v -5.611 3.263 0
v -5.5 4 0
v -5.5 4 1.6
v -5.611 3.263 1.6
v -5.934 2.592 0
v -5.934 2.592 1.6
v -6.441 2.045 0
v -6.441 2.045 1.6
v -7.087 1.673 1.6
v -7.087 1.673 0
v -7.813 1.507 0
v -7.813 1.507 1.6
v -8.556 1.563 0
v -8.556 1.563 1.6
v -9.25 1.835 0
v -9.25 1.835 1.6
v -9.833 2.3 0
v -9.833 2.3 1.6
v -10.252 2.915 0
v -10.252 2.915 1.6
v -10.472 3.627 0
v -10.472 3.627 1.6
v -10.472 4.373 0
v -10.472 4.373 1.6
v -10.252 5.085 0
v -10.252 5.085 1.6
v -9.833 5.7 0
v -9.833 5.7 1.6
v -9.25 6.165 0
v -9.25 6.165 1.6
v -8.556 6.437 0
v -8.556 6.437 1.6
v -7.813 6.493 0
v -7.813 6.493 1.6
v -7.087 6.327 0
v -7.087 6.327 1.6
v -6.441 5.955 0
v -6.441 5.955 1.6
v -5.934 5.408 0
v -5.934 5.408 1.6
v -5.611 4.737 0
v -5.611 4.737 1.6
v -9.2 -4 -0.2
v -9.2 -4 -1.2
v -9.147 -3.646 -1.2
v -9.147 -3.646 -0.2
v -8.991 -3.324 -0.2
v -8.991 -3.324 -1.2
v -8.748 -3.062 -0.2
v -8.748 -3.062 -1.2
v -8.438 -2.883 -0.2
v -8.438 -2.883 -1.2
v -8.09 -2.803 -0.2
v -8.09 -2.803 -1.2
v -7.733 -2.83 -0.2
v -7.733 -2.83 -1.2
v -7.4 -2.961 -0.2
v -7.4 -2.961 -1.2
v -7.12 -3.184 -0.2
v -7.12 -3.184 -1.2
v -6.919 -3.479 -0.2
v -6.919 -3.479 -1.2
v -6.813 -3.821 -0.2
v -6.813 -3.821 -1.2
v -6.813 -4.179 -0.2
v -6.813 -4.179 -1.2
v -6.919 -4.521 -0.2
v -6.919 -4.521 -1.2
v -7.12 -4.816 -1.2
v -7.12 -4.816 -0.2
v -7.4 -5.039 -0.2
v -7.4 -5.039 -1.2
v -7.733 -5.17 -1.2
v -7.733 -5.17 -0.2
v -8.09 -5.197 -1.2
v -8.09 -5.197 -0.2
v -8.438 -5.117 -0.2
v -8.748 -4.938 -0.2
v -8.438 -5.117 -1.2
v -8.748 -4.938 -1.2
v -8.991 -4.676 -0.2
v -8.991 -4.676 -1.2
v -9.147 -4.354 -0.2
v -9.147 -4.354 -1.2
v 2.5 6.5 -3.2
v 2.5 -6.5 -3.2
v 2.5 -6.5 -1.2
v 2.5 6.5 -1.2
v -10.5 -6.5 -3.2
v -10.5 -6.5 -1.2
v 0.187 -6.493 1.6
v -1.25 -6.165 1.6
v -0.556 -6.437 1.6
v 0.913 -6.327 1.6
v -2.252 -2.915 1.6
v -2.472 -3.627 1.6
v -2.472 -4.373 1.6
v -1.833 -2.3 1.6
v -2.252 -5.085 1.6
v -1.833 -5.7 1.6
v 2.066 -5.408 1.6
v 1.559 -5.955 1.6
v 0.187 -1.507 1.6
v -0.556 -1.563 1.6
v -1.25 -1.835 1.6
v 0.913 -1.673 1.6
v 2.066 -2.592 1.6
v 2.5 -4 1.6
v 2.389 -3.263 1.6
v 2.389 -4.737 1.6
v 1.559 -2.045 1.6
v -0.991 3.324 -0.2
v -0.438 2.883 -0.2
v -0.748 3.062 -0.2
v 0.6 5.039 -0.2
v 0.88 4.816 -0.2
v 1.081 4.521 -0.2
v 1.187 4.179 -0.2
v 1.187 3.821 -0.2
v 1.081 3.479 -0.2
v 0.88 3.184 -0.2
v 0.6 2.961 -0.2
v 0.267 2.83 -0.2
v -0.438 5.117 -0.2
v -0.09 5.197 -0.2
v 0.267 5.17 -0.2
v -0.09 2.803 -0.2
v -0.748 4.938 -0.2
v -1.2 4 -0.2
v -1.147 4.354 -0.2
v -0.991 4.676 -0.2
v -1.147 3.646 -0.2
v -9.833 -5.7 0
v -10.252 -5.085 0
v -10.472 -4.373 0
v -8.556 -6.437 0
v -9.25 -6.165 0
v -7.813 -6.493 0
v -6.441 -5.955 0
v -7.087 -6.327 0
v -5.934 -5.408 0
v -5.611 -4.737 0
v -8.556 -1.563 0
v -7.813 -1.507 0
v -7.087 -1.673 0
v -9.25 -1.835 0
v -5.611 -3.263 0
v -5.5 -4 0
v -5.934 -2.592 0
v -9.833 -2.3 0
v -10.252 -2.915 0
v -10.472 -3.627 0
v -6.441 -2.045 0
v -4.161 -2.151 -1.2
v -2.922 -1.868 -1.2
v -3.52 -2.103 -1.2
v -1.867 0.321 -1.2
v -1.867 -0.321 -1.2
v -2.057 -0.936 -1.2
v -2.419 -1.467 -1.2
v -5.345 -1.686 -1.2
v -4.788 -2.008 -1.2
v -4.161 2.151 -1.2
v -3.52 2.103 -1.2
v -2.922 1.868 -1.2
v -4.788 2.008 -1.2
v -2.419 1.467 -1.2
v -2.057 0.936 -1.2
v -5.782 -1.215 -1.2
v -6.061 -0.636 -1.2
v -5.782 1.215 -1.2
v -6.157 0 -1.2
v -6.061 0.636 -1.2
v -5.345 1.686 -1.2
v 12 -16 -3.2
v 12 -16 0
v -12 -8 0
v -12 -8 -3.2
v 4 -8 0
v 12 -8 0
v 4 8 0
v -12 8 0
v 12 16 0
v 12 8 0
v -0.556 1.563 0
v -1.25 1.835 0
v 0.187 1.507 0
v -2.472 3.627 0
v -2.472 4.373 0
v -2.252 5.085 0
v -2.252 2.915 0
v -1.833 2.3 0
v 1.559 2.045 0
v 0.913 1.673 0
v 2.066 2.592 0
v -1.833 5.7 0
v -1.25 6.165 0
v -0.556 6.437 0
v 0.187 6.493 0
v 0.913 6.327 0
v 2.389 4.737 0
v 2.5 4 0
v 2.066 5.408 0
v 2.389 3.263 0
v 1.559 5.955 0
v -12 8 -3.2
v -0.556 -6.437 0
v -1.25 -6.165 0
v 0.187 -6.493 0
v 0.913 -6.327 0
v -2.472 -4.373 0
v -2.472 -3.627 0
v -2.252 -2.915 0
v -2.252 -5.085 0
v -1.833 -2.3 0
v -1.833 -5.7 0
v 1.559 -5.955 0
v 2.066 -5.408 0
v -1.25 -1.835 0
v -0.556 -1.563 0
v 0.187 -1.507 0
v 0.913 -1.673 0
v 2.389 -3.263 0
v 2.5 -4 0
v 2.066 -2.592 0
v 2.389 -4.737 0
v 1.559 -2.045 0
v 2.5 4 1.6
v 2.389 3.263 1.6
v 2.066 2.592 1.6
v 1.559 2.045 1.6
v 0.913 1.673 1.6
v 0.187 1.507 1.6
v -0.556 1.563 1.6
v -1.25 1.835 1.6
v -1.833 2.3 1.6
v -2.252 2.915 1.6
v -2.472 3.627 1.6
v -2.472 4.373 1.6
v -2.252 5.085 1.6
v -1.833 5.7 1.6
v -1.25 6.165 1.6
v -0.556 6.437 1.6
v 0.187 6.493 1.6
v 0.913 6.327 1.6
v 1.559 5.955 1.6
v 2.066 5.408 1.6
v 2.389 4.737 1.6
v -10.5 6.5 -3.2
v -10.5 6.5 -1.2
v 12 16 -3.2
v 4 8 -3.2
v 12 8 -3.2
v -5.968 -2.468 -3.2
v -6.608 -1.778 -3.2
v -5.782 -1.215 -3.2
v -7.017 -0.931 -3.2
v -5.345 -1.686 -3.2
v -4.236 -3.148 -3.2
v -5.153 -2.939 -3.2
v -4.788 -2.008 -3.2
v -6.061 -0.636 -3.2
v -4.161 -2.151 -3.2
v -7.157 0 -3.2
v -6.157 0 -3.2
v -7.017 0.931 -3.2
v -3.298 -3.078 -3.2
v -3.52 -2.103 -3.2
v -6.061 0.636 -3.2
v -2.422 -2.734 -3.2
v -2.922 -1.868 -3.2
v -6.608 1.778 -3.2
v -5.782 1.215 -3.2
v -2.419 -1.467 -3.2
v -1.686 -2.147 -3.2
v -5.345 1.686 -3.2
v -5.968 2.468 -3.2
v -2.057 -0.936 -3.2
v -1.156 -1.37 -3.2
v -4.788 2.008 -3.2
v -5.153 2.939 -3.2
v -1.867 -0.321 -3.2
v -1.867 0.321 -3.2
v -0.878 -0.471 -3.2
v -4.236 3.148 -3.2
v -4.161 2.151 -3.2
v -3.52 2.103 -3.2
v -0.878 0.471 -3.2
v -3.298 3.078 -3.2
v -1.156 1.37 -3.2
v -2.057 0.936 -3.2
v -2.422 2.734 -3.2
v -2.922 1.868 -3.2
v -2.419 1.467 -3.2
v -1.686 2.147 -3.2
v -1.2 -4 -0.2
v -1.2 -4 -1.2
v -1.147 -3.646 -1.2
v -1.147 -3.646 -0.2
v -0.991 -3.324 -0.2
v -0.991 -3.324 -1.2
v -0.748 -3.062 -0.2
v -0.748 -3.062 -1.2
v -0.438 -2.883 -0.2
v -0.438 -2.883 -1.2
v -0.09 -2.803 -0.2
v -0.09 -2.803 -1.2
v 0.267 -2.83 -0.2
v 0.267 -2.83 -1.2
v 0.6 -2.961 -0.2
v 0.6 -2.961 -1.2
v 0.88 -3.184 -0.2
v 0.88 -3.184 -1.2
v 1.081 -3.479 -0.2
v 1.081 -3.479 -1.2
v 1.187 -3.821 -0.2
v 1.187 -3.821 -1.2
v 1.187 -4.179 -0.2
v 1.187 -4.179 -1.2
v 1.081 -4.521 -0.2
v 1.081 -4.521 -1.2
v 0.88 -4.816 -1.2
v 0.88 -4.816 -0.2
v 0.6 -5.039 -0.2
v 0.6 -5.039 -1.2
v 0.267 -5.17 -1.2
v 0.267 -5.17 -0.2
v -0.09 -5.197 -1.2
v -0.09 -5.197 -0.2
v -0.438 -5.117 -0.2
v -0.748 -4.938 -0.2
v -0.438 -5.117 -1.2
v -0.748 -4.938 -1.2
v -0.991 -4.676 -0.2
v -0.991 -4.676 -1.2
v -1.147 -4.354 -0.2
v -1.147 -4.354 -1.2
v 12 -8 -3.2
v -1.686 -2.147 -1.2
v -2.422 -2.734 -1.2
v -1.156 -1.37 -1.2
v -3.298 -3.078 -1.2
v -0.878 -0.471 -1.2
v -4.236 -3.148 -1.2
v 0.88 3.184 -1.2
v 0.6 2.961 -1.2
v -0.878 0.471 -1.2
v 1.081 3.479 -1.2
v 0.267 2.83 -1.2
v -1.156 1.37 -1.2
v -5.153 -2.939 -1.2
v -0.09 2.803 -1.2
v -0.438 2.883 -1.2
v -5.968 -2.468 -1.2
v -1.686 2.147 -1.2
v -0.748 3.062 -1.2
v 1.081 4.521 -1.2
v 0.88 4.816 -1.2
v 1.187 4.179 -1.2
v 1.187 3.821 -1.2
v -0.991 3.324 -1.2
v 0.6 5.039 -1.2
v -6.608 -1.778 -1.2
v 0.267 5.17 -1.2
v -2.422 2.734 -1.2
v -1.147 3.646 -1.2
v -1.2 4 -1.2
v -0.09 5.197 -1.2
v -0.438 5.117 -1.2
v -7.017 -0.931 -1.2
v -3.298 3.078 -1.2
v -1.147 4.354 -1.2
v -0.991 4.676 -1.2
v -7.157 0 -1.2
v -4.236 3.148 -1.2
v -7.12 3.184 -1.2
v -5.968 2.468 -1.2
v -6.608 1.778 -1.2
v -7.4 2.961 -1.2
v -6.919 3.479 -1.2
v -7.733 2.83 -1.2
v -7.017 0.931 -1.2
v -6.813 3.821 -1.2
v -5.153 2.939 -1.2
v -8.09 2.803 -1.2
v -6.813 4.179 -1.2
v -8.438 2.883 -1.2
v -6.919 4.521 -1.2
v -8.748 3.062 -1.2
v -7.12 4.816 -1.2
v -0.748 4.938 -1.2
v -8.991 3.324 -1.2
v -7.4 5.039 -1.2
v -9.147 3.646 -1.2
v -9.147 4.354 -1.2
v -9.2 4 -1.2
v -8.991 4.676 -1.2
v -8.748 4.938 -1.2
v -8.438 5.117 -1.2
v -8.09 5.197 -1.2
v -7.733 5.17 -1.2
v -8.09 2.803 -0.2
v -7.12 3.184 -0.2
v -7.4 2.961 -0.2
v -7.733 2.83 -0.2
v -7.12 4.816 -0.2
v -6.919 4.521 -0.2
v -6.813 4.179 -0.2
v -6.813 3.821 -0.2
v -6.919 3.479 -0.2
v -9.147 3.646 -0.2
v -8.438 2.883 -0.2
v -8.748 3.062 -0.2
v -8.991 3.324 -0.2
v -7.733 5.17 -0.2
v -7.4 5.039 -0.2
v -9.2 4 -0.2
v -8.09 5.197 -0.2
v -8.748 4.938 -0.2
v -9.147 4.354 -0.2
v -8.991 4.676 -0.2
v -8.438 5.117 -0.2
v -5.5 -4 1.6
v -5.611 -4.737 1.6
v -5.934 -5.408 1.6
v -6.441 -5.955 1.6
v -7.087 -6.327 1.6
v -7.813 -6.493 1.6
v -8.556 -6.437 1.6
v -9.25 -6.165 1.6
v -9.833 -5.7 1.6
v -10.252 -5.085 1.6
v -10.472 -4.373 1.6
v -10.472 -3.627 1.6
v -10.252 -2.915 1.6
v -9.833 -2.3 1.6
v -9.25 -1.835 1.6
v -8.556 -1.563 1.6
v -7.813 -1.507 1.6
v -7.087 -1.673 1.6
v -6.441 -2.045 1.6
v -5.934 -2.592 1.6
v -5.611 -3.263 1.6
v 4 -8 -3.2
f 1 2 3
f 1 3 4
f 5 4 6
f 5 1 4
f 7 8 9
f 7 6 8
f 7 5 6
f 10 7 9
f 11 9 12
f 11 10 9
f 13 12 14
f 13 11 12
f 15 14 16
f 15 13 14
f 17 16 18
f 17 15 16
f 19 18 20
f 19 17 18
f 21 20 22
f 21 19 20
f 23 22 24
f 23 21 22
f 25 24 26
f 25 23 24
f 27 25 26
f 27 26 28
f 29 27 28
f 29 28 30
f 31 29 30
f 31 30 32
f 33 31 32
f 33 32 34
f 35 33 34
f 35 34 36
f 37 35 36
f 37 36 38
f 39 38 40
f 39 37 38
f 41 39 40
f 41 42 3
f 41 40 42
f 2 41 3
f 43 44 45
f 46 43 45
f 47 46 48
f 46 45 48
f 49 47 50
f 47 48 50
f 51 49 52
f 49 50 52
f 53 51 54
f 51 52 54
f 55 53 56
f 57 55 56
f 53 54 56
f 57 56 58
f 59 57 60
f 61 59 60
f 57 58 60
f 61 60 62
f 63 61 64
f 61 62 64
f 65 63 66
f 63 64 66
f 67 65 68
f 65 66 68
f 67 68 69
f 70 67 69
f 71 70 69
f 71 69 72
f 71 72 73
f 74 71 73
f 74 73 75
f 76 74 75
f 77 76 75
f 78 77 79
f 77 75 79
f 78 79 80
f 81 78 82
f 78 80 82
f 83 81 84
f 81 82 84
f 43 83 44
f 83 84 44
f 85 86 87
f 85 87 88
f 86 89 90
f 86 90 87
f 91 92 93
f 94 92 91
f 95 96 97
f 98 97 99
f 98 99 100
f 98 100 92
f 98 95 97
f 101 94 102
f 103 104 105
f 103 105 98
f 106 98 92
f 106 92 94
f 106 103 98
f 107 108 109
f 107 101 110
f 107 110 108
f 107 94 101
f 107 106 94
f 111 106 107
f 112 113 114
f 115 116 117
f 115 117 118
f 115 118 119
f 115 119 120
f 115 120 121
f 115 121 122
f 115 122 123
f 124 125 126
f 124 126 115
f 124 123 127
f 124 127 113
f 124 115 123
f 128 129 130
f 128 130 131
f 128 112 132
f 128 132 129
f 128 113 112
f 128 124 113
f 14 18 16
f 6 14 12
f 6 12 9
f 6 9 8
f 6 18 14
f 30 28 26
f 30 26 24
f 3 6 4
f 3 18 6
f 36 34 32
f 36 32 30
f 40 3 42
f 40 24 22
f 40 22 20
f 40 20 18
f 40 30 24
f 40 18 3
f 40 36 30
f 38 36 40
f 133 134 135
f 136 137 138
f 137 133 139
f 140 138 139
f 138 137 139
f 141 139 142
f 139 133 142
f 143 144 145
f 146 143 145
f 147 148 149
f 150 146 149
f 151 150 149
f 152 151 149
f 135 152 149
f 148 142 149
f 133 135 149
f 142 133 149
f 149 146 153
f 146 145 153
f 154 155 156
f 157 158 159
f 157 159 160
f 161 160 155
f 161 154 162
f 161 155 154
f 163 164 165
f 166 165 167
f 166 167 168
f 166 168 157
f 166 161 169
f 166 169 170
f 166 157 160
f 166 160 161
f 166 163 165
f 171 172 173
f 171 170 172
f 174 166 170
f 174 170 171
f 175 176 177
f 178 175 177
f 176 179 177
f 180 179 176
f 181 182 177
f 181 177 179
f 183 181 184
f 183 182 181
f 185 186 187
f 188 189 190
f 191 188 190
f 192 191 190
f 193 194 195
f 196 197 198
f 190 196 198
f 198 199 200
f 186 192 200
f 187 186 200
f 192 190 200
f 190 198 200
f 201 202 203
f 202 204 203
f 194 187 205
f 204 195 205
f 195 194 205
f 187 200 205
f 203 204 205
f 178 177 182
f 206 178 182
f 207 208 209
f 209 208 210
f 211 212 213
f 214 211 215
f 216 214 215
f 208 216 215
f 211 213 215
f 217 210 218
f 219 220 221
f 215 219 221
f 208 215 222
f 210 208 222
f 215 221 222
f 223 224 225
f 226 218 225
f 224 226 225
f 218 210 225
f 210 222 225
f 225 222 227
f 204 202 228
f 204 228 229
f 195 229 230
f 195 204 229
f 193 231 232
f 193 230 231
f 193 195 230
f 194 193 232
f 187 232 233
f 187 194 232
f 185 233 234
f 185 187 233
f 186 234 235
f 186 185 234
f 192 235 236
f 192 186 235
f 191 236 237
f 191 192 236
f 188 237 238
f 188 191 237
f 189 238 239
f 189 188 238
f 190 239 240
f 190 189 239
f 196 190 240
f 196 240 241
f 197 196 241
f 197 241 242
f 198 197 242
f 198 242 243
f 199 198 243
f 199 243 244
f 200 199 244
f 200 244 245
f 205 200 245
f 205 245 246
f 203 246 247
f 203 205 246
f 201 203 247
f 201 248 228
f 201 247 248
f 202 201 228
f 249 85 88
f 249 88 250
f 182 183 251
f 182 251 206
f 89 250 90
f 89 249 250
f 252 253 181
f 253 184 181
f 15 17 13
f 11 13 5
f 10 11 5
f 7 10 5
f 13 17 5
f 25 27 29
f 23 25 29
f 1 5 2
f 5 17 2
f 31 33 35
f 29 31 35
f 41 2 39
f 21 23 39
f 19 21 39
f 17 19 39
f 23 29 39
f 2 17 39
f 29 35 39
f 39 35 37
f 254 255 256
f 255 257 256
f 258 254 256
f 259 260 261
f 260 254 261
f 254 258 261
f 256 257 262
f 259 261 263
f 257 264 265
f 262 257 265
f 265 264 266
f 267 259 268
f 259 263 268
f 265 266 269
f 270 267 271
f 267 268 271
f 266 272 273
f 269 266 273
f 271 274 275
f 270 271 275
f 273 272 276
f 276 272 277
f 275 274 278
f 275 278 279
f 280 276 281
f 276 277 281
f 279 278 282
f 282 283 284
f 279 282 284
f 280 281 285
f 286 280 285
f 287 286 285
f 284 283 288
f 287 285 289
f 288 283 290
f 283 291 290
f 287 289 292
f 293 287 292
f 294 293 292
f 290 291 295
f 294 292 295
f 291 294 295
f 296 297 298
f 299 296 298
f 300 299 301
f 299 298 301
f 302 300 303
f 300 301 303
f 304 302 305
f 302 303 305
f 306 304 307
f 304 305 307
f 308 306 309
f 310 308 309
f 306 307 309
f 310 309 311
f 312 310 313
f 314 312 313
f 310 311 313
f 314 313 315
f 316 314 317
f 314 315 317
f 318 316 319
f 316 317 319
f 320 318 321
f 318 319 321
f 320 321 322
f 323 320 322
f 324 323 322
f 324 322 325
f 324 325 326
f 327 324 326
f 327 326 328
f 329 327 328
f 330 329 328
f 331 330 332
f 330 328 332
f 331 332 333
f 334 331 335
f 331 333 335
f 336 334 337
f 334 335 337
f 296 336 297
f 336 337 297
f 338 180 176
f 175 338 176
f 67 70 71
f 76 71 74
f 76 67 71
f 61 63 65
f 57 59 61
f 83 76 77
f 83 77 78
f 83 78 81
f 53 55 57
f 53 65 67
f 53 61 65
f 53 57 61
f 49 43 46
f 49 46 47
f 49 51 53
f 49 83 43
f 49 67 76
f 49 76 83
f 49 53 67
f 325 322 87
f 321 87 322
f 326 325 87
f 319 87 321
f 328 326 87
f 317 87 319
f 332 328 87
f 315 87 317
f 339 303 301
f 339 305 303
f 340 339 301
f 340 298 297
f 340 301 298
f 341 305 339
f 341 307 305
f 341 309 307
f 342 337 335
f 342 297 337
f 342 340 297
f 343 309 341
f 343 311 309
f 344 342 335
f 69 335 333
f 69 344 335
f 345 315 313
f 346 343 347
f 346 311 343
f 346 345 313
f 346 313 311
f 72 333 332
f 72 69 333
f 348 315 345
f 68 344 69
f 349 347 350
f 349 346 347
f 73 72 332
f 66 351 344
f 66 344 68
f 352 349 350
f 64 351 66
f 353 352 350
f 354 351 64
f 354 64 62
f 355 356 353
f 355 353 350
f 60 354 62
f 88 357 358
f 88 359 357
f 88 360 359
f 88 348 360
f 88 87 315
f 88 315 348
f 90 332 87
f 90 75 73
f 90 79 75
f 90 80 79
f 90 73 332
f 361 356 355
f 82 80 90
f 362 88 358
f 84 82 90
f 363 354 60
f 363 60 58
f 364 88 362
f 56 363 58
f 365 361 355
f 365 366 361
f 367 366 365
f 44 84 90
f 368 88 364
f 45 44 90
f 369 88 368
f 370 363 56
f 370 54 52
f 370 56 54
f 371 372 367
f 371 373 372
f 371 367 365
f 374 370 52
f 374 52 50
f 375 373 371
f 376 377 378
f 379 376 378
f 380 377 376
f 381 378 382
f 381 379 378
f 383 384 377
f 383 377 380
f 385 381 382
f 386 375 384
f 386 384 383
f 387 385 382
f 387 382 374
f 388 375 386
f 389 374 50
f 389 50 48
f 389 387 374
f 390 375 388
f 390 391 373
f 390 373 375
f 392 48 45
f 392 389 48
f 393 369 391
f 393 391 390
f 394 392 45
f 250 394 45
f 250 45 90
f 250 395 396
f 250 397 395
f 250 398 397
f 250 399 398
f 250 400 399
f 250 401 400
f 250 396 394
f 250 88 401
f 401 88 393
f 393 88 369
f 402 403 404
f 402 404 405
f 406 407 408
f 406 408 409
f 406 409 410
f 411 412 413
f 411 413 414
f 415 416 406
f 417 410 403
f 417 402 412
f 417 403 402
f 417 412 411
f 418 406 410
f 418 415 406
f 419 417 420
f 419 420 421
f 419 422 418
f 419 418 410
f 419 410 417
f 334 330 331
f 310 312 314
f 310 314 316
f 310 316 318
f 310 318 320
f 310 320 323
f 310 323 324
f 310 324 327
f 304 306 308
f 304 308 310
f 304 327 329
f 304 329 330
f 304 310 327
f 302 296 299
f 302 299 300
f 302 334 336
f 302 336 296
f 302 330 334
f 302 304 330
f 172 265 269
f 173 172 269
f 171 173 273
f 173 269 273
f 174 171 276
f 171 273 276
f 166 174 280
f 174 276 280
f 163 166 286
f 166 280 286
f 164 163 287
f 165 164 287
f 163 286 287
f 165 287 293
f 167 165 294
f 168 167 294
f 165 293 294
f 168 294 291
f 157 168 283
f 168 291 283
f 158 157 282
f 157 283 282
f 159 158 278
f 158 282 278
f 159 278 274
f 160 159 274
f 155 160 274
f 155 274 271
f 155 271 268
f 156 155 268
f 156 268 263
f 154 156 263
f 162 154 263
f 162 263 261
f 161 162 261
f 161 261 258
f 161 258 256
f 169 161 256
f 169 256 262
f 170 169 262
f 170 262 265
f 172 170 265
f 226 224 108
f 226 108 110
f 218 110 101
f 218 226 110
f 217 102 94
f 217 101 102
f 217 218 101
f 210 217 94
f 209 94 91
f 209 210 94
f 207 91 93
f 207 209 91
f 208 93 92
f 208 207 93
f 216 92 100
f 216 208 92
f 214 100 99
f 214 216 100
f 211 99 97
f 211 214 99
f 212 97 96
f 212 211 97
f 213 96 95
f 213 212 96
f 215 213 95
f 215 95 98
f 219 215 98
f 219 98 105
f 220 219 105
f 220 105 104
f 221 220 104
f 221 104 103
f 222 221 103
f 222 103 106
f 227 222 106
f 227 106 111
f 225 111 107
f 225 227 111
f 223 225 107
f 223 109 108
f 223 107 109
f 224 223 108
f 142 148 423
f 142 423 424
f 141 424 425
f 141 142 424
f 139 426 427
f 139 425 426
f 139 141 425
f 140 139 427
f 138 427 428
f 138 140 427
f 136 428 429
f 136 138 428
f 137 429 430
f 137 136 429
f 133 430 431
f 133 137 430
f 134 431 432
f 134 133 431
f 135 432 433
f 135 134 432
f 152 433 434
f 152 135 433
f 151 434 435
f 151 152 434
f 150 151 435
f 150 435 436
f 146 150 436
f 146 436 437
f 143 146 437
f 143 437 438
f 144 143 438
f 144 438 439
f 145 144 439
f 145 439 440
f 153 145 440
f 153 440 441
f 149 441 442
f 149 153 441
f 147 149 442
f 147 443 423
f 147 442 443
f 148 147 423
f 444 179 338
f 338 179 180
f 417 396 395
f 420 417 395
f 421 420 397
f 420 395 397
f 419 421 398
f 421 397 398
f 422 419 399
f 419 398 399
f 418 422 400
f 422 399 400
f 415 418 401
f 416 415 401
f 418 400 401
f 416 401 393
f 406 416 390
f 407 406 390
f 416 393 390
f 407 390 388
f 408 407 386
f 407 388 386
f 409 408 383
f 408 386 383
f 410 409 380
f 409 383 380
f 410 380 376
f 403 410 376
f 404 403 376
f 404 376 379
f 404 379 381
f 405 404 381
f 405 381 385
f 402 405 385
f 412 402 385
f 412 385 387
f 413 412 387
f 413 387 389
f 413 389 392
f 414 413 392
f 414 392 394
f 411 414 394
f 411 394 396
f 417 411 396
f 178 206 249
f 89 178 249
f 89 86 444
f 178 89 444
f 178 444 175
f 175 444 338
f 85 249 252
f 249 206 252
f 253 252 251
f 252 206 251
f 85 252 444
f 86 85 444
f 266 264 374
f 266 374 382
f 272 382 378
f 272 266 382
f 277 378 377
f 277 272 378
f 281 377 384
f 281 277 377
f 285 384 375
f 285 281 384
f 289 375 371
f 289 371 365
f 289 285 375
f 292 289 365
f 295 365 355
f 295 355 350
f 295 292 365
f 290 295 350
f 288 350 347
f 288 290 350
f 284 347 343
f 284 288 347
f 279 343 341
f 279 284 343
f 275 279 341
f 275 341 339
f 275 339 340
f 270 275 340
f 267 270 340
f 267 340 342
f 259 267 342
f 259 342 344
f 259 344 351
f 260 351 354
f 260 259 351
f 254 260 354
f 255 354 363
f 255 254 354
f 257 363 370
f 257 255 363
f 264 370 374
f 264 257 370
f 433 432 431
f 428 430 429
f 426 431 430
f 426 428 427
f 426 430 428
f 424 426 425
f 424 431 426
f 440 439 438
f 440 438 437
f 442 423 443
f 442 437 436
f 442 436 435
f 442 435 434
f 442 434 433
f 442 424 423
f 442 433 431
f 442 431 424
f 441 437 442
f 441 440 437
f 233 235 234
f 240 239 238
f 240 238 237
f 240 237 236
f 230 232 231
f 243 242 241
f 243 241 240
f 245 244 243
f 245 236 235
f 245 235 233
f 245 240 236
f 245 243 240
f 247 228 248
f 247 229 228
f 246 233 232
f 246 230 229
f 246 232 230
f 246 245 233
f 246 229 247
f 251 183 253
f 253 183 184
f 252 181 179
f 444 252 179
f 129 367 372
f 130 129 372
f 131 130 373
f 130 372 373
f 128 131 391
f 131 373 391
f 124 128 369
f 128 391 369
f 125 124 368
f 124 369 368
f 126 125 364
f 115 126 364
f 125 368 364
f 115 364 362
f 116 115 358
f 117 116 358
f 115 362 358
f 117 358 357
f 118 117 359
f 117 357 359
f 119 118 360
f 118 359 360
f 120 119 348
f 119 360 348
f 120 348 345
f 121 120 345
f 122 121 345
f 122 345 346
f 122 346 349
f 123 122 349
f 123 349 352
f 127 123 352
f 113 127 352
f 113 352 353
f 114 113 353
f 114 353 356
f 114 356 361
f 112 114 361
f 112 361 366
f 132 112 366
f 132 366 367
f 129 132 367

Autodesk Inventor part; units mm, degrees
ref_plane "YZ Plane" through (0, 0, 0) normal (1, 0, 0) x (0, 1, 0)
ref_plane "XZ Plane" through (0, 0, 0) normal (0, 1, 0) x (-1, 0, 0)
ref_plane "XY Plane" through (0, 0, 0) normal (0, 0, 1) x (1, 0, 0)
sketch "Sketch1" plane through (0, 0, 0) normal (0, 0, 1) x (1, 0, 0)
  line L0 (-16.8, 0) -> (16.8, 0) construction
  line L1 (0, -22.4) -> (0, 22.4) construction
  line L2 (-12, 16) -> (12, 16)
  line L3 (12, 16) -> (12, -16)
  line L4 (12, -16) -> (-12, -16)
  line L5 (-12, -16) -> (-12, 16)
  line L6 (-8, 4) -> (0, 4) construction
  line L7 (0, 4) -> (0, -4) construction
  line L8 (0, -4) -> (-8, -4) construction
  line L9 (-8, -4) -> (-8, 4) construction
  circle A0 centre (-8, 4) radius 2.5
  circle A1 centre (0, 4) radius 2.5
  circle A2 centre (0, -4) radius 2.5
  circle A3 centre (-8, -4) radius 2.5
  line L10 (12, 8) -> (4, 8)
  line L11 (4, 16) -> (4, -16)
  line L12 (4, -8) -> (12, -8)
  line L13 (12, 16) -> (-12, 8)
  line L14 (12, -16) -> (-12, -8)
  line L15 (8, -12) -> (8, 12) construction
  line L16 (5.5, -14.5) -> (10.5, -14.5)
  line L17 (10.5, -14.5) -> (10.5, -9.5)
  line L18 (10.5, -9.5) -> (5.5, -9.5)
  line L19 (5.5, -9.5) -> (5.5, -14.5)
  line L20 (5.5, 9.5) -> (10.5, 9.5)
  line L21 (10.5, 9.5) -> (10.5, 14.5)
  line L22 (10.5, 14.5) -> (5.5, 14.5)
  line L23 (5.5, 14.5) -> (5.5, 9.5)
  line L24 (5.5, -9.5) -> (10.5, -14.5) construction
  line L25 (5.5, 9.5) -> (10.5, 14.5) construction
  point P0 (12, 0)
  point P1 (0, 16)
  point P2 (0, 0)
  point P3 (4, 0)
  point P4 (8, 0)
  point P5 (8, -8)
  dimension "d0" = 24
  dimension "d1" = 32
  dimension "d2" = 5
  dimension "d3" = 8
  dimension "d4" = 8
  dimension "d5" = 16
  dimension "d10" = 24
  dimension "d11" = 5
  dimension "d14" = 8
extrude "Extrusion1" add sketch "Sketch1" against normal blind 3.2 contours L13 L11 L14 L5 | L3 L10 L11 L13 L23 L20 L21 L22 | L22 L21 L20 L23 L13 | L11 L12 L3 L14 L16 L17 L18 L19 | L19 L18 L17 L16 L14 | A0 | A1 | A2 | A3
extrude "Extrusion2" add sketch "Sketch1" along normal blind 1.6 separate body contours A0 | A1 | A2 | A3
sketch "Sketch3" plane through (0, 0, -3.2) normal (0, 0, -1) x (-1, 0, 0)
  line L0 (-4, 8) -> (-12, 8) projected
  line L1 (-4, -8) -> (-4, 8) projected
  line L2 (-2.5, 6.5) -> (10.5, 6.5)
  line L3 (10.5, 6.5) -> (10.5, -6.5)
  line L4 (10.5, -6.5) -> (-2.5, -6.5)
  line L5 (-2.5, -6.5) -> (-2.5, 6.5)
  circle A0 centre (0, 4) radius 2.5 construction
  circle A1 centre (8, 4) radius 2.5 construction
  circle A2 centre (8, -4) radius 2.5 construction
  circle A3 centre (0, -4) radius 2.5 construction
  circle A4 centre (4, 0) radius 3.1569
  circle A5 centre (4, 0) radius 2.1569
  point P0 (0, 0)
  dimension "d20" = 13
  dimension "d21" = 13
  dimension "d22" = 1.5
  dimension "d23" = 1.5
  dimension "d24" = 1
extrude "Extrusion6" cut sketch "Sketch3" against normal blind 2 bodies 1
sketch "Sketch4" plane through (0, 0, -1.2) normal (0, 0, -1) x (-1, 0, 0)
  line L0 (-12, 16) -> (12, 8) projected
  line L1 (12, 8) -> (12, -8) projected
  line L2 (12, -8) -> (-12, -16) projected
  line L3 (-12, -16) -> (-12, -8) projected
  line L4 (-12, -8) -> (-4, -8) projected
  line L5 (-4, -8) -> (-4, 8) projected
  line L6 (-4, 8) -> (-12, 8) projected
  line L7 (-12, 8) -> (-12, 16) projected
  circle A0 centre (8, -4) radius 2.5 projected
  circle A1 centre (8, 4) radius 2.5 projected
  circle A2 centre (0, 4) radius 2.5 projected
  circle A3 centre (0, -4) radius 2.5 projected
  circle A4 centre (0, 4) radius 1.2
  circle A5 centre (8, 4) radius 1.2
  circle A6 centre (8, -4) radius 1.2
  circle A7 centre (0, -4) radius 1.2
  point P0 (0, 0)
  dimension "d27" = 2.4
  dimension "d28" = 2.4
  dimension "d29" = 2.4
  dimension "d30" = 2.4
extrude "Extrusion7" cut sketch "Sketch4" against normal blind 1 contours A4 | A5 | A6 | A7 bodies 1
equation "\"d28\" = d27"
equation "\"d29\" = d28"
equation "\"d30\" = d29"
properties part number "LEGO Brick 4859" material "Steel"
